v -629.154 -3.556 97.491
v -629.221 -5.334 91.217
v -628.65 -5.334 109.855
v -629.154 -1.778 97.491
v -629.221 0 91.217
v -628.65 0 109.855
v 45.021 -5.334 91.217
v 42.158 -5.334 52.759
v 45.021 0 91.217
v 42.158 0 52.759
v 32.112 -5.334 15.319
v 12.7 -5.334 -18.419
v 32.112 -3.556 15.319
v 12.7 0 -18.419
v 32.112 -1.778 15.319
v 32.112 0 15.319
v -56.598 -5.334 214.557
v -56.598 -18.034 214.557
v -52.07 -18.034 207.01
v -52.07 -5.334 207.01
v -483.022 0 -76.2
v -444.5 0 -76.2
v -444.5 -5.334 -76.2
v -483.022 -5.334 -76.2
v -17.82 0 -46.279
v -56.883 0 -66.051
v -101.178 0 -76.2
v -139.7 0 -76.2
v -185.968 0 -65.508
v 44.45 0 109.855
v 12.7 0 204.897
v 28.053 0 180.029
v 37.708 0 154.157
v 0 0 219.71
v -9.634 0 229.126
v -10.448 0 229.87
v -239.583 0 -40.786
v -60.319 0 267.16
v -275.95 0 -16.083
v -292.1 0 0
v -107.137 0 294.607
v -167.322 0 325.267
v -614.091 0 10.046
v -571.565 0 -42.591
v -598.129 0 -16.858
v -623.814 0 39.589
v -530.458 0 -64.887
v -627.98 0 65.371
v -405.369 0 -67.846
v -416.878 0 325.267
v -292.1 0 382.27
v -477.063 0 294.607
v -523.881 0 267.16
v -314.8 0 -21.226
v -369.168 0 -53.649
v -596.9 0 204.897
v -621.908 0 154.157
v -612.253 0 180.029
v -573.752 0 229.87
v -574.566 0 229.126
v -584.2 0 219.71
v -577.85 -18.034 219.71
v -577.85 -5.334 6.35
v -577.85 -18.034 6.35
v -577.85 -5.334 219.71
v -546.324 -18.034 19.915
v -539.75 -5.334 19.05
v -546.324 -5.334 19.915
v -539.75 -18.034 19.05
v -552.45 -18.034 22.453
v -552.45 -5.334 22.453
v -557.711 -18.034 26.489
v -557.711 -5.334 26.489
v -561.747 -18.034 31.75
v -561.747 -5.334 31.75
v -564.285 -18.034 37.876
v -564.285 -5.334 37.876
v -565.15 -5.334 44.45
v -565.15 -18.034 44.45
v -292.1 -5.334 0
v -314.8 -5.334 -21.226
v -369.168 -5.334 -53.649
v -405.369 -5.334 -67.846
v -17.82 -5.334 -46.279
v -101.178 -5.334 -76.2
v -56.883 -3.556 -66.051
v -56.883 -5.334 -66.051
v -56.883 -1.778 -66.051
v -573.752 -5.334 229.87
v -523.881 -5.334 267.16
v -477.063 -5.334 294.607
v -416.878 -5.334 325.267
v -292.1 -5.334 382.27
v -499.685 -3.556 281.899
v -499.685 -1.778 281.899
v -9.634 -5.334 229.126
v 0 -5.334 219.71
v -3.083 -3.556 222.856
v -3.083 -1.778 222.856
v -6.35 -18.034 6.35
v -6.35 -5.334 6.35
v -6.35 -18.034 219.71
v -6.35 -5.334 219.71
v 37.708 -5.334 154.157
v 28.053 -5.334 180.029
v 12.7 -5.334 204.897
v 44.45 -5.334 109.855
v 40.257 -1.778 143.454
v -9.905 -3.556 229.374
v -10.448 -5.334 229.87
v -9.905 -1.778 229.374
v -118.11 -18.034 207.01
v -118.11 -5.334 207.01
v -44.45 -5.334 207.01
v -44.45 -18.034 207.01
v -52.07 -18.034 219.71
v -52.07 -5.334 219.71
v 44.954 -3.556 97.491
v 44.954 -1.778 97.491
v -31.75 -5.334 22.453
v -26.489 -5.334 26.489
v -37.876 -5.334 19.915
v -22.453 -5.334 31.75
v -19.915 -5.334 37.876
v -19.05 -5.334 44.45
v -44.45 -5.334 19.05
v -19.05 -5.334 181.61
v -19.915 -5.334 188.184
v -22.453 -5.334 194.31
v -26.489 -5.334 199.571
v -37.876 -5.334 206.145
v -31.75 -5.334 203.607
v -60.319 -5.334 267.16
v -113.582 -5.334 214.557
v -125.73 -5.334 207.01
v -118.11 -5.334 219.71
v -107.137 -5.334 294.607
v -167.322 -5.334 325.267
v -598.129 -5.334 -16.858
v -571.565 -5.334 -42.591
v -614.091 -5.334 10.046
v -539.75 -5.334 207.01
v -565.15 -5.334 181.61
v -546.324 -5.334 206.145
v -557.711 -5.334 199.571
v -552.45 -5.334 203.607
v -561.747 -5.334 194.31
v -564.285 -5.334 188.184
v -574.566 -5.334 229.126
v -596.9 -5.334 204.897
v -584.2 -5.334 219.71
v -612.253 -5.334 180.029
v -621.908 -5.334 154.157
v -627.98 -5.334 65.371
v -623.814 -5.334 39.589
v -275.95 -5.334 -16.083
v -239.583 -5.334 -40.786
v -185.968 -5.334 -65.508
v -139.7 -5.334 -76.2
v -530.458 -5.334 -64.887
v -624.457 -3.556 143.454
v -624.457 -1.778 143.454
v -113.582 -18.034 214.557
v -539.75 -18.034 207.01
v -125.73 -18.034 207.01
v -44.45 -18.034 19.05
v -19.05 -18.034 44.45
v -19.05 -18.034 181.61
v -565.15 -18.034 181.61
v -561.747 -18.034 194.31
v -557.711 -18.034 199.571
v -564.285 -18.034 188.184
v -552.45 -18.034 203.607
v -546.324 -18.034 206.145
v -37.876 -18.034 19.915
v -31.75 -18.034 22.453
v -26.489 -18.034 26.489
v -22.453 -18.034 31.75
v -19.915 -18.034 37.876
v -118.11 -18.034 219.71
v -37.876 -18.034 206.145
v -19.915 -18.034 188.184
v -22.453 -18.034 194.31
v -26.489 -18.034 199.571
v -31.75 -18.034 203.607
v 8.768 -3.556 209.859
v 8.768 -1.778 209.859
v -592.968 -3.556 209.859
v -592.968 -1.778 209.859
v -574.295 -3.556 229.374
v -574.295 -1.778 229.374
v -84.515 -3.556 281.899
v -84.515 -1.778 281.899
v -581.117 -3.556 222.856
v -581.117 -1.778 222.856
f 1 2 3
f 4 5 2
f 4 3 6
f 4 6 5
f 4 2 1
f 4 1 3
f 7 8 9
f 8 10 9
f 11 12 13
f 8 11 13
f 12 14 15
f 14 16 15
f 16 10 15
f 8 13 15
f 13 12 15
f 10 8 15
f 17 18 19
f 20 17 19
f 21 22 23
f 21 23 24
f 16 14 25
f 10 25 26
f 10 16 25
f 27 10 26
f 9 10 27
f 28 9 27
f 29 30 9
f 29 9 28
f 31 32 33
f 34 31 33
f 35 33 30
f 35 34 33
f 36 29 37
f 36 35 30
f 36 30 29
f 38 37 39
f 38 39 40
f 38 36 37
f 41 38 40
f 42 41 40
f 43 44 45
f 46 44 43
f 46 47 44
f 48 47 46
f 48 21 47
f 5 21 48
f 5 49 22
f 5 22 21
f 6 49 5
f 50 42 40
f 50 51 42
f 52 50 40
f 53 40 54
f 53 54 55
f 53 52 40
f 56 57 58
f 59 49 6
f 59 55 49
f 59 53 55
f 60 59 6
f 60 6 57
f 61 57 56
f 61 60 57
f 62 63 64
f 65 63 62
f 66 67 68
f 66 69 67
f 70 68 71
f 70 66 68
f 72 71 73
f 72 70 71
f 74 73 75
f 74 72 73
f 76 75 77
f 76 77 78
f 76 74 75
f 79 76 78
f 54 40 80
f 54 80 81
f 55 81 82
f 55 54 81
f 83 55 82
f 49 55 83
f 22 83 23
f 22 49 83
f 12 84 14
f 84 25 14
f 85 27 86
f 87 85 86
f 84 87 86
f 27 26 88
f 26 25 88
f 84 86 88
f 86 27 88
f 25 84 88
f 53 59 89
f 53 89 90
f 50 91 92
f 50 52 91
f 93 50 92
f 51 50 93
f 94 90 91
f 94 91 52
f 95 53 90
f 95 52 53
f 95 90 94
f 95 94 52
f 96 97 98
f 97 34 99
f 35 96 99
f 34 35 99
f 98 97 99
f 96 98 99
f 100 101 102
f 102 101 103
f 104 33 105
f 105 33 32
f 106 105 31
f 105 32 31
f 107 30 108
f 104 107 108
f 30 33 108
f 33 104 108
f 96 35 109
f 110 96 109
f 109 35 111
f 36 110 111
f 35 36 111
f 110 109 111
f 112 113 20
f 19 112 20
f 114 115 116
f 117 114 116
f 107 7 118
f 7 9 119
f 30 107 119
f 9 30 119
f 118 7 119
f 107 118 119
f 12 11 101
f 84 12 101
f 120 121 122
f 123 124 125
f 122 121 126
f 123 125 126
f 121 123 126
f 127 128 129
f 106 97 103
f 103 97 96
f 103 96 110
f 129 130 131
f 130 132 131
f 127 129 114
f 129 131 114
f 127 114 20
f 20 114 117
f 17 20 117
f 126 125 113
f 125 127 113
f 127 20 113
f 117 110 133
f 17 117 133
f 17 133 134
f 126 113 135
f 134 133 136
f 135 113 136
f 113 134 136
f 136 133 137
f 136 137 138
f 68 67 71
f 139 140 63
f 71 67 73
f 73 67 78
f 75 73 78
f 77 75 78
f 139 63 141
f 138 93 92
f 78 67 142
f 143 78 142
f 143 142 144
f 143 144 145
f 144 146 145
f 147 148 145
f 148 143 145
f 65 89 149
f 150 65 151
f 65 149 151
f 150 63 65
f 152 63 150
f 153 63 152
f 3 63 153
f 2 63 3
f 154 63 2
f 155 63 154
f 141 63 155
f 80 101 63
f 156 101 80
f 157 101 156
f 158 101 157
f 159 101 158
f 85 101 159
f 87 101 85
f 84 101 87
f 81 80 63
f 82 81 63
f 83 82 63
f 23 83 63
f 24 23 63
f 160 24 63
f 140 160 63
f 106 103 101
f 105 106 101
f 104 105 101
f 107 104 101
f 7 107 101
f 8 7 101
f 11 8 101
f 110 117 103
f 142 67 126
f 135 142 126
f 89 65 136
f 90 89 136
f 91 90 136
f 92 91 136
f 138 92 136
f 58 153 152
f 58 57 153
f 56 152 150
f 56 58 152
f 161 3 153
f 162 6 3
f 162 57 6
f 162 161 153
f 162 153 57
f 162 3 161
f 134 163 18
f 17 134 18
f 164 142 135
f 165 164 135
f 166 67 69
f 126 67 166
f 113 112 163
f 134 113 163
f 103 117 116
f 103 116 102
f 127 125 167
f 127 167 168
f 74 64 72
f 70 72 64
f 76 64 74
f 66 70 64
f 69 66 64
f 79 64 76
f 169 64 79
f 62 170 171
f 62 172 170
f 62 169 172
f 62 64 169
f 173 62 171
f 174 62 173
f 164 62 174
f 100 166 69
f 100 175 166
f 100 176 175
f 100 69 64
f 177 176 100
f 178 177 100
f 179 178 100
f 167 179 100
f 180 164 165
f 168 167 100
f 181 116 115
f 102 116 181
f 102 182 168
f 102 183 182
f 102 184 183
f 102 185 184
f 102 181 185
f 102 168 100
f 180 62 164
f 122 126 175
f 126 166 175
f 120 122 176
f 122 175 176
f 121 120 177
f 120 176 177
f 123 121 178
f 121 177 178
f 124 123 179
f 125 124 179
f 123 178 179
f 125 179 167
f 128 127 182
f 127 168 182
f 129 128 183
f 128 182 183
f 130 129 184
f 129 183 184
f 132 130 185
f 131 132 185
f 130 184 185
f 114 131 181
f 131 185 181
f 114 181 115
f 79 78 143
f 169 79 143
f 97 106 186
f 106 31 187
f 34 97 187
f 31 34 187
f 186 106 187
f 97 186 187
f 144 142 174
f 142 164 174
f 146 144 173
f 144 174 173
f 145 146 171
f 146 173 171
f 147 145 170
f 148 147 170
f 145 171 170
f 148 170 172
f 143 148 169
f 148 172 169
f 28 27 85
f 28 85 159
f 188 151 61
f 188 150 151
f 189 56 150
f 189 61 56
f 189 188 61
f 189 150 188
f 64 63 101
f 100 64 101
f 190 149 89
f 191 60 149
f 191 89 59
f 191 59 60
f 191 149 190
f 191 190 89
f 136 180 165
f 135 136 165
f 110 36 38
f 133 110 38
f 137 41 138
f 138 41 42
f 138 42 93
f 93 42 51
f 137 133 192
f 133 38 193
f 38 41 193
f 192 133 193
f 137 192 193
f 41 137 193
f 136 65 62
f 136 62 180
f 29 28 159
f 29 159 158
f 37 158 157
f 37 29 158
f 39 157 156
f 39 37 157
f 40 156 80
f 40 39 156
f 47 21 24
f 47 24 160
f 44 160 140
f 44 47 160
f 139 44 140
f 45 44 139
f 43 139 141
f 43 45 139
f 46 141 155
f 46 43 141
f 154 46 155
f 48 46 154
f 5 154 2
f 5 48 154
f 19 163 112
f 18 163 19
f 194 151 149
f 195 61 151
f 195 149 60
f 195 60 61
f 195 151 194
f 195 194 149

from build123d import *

# Parameters (mm, degrees)
F0_W     = 584.2
F0_H     = 219.71
F1_DEPTH = 5.334
F2_W     = 571.5
F2_H     = 213.36
F2_W_2   = 546.1
F2_H_2   = 187.96
F3_DEPTH = 12.7
F4_R     = 25.4
F6_DEPTH = 12.7
F7_W     = 12.7
F7_H     = 109.855
F8_DEPTH = 5.334


# Not quite as in the source:
# - a feature names something its author has since deleted; it is built from what else it names


with BuildPart() as f1:
    # F0 (on Front) → F1 (new body)
    with BuildSketch(Plane.XZ):
        with Locations((-292.1, 109.855)):
            Rectangle(F0_W, F0_H)
    extrude(amount=F1_DEPTH)

    # F2 (on face) → F3 (join)
    with BuildSketch(Plane.XZ.offset(5.334)):
        with Locations((-292.1, 113.03)):
            Rectangle(F2_W, F2_H)
        with Locations((-292.1, 113.03)):
            Rectangle(F2_W_2, F2_H_2, mode=Mode.SUBTRACT)
    extrude(amount=F3_DEPTH)

    # F4
    f4_edges = [f1.edges().sort_by_distance(p)[0] for p in [
        (-565.15, -11.684, 207.01),
        (-19.05, -11.684, 207.01),
        (-19.05, -11.684, 19.05),
        (-565.15, -11.684, 19.05),
    ]]
    fillet(f4_edges, radius=F4_R)

    # F5 (on face) → F6 (cut)
    with BuildSketch(Plane.XZ.offset(18.034)):
        Polygon((-118.11, 219.71), (-125.73, 207.01), (-118.11, 207.01), (-113.5820166854, 214.5566388576), (-110.49, 219.71), align=None)
        Polygon((-56.5979833146, 214.5566388576), (-52.07, 207.01), (-44.45, 207.01), (-52.07, 219.71), (-59.69, 219.71), align=None)
        Polygon((-59.69, 219.71), (-110.49, 219.71), (-113.5820166854, 214.5566388576), (-56.5979833146, 214.5566388576), align=None)
    extrude(amount=-F6_DEPTH, mode=Mode.SUBTRACT)

    # F7 (on face) → F8 (join)
    with BuildSketch(Plane(origin=(0, 0, 0), x_dir=(-1, 0, 0), z_dir=(0, 1, 0))):
        with BuildLine():
            Line((292.1, 0), (0, 0))
            Line((0, 0), (-12.7, 0))
            Line((-12.7, 0), (-12.7, -18.4187279276))
            Line((-12.7, -18.4187279276), (273.05, -18.4187279276))
            add(Edge.make_bspline(
                [(292.1, 0), (287.6007994264, -5.2493532032), (283.1015988528, -10.4987064064), (273.05, -18.4187279276)],
                knots=[0, 0, 0, 0, 0.0728769887, 0.0728769887, 0.0728769887, 0.0728769887], degree=3))
        make_face()
        with Locations((-6.35, 54.9275)):
            Rectangle(F7_W, F7_H)
        with BuildLine():
            Line((-12.7, -18.4187279276), (-12.7, 0))
            Line((-12.7, 0), (-12.7, 109.855))
            Line((-12.7, 109.855), (-44.45, 109.855))
            add(Edge.make_bspline(
                [(-45.0211916342, 91.2168765815), (-45.0211916609, 97.5162300277), (-44.815953395, 103.7471754572), (-44.45, 109.855)],
                knots=[0.5639304479, 0.5639304479, 0.5639304479, 0.5639304479, 0.5870347541, 0.5870347541, 0.5870347541, 0.5870347541], degree=3))
            add(Edge.make_bspline(
                [(-12.7, -18.4187279276), (-37.5240442459, 12.5724048939), (-45.0211914731, 53.1440785365), (-45.0211916342, 91.2168765815)],
                knots=[0.4242898339, 0.4242898339, 0.4242898339, 0.4242898339, 0.5639304479, 0.5639304479, 0.5639304479, 0.5639304479], degree=3))
        make_face()
        with BuildLine():
            Line((584.2, 0), (292.1, 0))
            add(Edge.make_bspline(
                [(292.1, 0), (296.5992005736, -5.2493532032), (301.0984011472, -10.4987064064), (311.15, -18.4187279276)],
                knots=[0, 0, 0, 0, 0.0728769887, 0.0728769887, 0.0728769887, 0.0728769887], degree=3))
            Line((311.15, -18.4187279276), (596.9, -18.4187279276))
            Line((596.9, -18.4187279276), (596.9, 0))
            Line((596.9, 0), (584.2, 0))
        make_face()
        with BuildLine():
            Line((-12.7, 109.855), (0, 109.855))
            Line((0, 109.855), (0, 219.71))
            add(Edge.make_bspline(
                [(-12.7, 204.8965850641), (-8.9139816017, 209.8723459181), (-4.696536047, 214.8060326557), (0, 219.71)],
                knots=[0.7188244338, 0.7188244338, 0.7188244338, 0.7188244338, 0.7411532433, 0.7411532433, 0.7411532433, 0.7411532433], degree=3))
            Line((-12.7, 204.8965850641), (-12.7, 109.855))
        make_face()
        with BuildLine():
            Line((-44.45, 109.855), (-12.7, 109.855))
            Line((-12.7, 109.855), (-12.7, 204.8965850641))
            add(Edge.make_bspline(
                [(-44.45, 109.855), (-42.3625587956, 144.6947495266), (-35.0459362357, 175.5285199707), (-12.7, 204.8965850641)],
                knots=[0.5870347541, 0.5870347541, 0.5870347541, 0.5870347541, 0.7188244338, 0.7188244338, 0.7188244338, 0.7188244338], degree=3))
        make_face()
        with BuildLine():
            Line((273.05, -18.4187279276), (-12.7, -18.4187279276))
            add(Edge.make_bspline(
                [(101.1778231225, -76.2), (55.3698473988, -71.3735043498), (12.4455878923, -49.8112861475), (-12.7, -18.4187279276)],
                knots=[0.2828404673, 0.2828404673, 0.2828404673, 0.2828404673, 0.4242898339, 0.4242898339, 0.4242898339, 0.4242898339], degree=3))
            Line((101.1778231225, -76.2), (139.7, -76.2))
            add(Edge.make_bspline(
                [(273.05, -18.4187279276), (249.5100545477, -36.9667099273), (195.5177305995, -70.1620926298), (139.7, -76.2)],
                knots=[0.0728769887, 0.0728769887, 0.0728769887, 0.0728769887, 0.2435483779, 0.2435483779, 0.2435483779, 0.2435483779], degree=3))
        make_face()
        with BuildLine():
            Line((596.9, -18.4187279276), (311.15, -18.4187279276))
            add(Edge.make_bspline(
                [(311.15, -18.4187279276), (334.6899454523, -36.9667099273), (388.6822694005, -70.1620926298), (444.5, -76.2)],
                knots=[0.0728769887, 0.0728769887, 0.0728769887, 0.0728769887, 0.2435483779, 0.2435483779, 0.2435483779, 0.2435483779], degree=3))
            Line((444.5, -76.2), (483.0221768775, -76.2))
            add(Edge.make_bspline(
                [(483.0221768775, -76.2), (528.8301526012, -71.3735043498), (571.7544121077, -49.8112861475), (596.9, -18.4187279276)],
                knots=[0.2828404673, 0.2828404673, 0.2828404673, 0.2828404673, 0.4242898339, 0.4242898339, 0.4242898339, 0.4242898339], degree=3))
        make_face()
        with Locations((590.55, 54.9275)):
            Rectangle(F7_W, F7_H)
        with BuildLine():
            add(Edge.make_bspline(
                [(0, 219.71), (3.0172855437, 222.8605496023), (6.2323113272, 225.9988327955), (9.6341187106, 229.1255293763)],
                knots=[0.7411532433, 0.7411532433, 0.7411532433, 0.7411532433, 0.7554983677, 0.7554983677, 0.7554983677, 0.7554983677], degree=3))
            Line((0, 219.71), (292.1, 219.71))
            Line((292.1, 219.71), (9.6341187106, 229.1255293763))
        make_face()
        with BuildLine():
            Line((596.9, 0), (596.9, -18.4187279276))
            add(Edge.make_bspline(
                [(596.9, -18.4187279276), (621.7240438178, 12.5724043593), (629.2211912145, 53.144077137), (629.2211916342, 91.2168746116)],
                knots=[0.4242898339, 0.4242898339, 0.4242898339, 0.4242898339, 0.5639304455, 0.5639304455, 0.5639304455, 0.5639304455], degree=3))
            add(Edge.make_bspline(
                [(629.2211916342, 91.2168746116), (629.2211917037, 97.5162287286), (629.0159534331, 103.7471748205), (628.65, 109.855)],
                knots=[0.5639304455, 0.5639304455, 0.5639304455, 0.5639304455, 0.5870347541, 0.5870347541, 0.5870347541, 0.5870347541], degree=3))
            Line((628.65, 109.855), (596.9, 109.855))
            Line((596.9, 109.855), (596.9, 0))
        make_face()
        with BuildLine():
            Line((584.2, 219.71), (584.2, 109.855))
            Line((584.2, 109.855), (596.9, 109.855))
            Line((596.9, 109.855), (596.9, 204.8965850641))
            add(Edge.make_bspline(
                [(596.9, 204.8965850641), (593.1139816017, 209.8723459181), (588.896536047, 214.8060326557), (584.2, 219.71)],
                knots=[0.7188244338, 0.7188244338, 0.7188244338, 0.7188244338, 0.7411532433, 0.7411532433, 0.7411532433, 0.7411532433], degree=3))
        make_face()
        with BuildLine():
            add(Edge.make_bspline(
                [(9.6341187106, 229.1255293763), (9.9041896656, 229.3737591661), (10.1754378752, 229.6219159272), (10.4478578559, 229.87)],
                knots=[0.7554983677, 0.7554983677, 0.7554983677, 0.7554983677, 0.7566372333, 0.7566372333, 0.7566372333, 0.7566372333], degree=3))
            Line((9.6341187106, 229.1255293763), (292.1, 219.71))
            Line((292.1, 219.71), (574.5658812894, 229.1255293763))
            add(Edge.make_bspline(
                [(574.5658812894, 229.1255293763), (574.2958103344, 229.3737591661), (574.0245621248, 229.6219159272), (573.7521421441, 229.87)],
                knots=[0.7554983677, 0.7554983677, 0.7554983677, 0.7554983677, 0.7566372333, 0.7566372333, 0.7566372333, 0.7566372333], degree=3))
            Line((573.7521421441, 229.87), (514.35, 229.87))
            Line((514.35, 229.87), (292.1, 229.87))
            Line((292.1, 229.87), (69.85, 229.87))
            Line((69.85, 229.87), (10.4478578559, 229.87))
        make_face()
        with BuildLine():
            Line((574.5658812894, 229.1255293763), (292.1, 219.71))
            Line((292.1, 219.71), (584.2, 219.71))
            add(Edge.make_bspline(
                [(584.2, 219.71), (581.1827144563, 222.8605496023), (577.9676886728, 225.9988327955), (574.5658812894, 229.1255293763)],
                knots=[0.7411532433, 0.7411532433, 0.7411532433, 0.7411532433, 0.7554983677, 0.7554983677, 0.7554983677, 0.7554983677], degree=3))
        make_face()
        with BuildLine():
            Line((596.9, 204.8965850641), (596.9, 109.855))
            Line((596.9, 109.855), (628.65, 109.855))
            add(Edge.make_bspline(
                [(628.65, 109.855), (626.5625587956, 144.6947495266), (619.2459362357, 175.5285199707), (596.9, 204.8965850641)],
                knots=[0.5870347541, 0.5870347541, 0.5870347541, 0.5870347541, 0.7188244338, 0.7188244338, 0.7188244338, 0.7188244338], degree=3))
        make_face()
        with BuildLine():
            add(Edge.make_bspline(
                [(10.4478578559, 229.87), (68.6609423687, 282.8827748158), (180.3804711844, 332.5763874079), (292.1, 382.27)],
                knots=[0.7566372333, 0.7566372333, 0.7566372333, 0.7566372333, 1, 1, 1, 1], degree=3))
            Line((10.4478578559, 229.87), (69.85, 229.87))
            Line((69.85, 229.87), (292.1, 229.87))
            Line((292.1, 229.87), (292.1, 382.27))
        make_face()
        with BuildLine():
            add(Edge.make_bspline(
                [(573.7521421441, 229.87), (515.5390576313, 282.8827748158), (403.8195288156, 332.5763874079), (292.1, 382.27)],
                knots=[0.7566372333, 0.7566372333, 0.7566372333, 0.7566372333, 1, 1, 1, 1], degree=3))
            Line((292.1, 382.27), (292.1, 229.87))
            Line((292.1, 229.87), (514.35, 229.87))
            Line((514.35, 229.87), (573.7521421441, 229.87))
        make_face()
    extrude(amount=-F8_DEPTH)


solid = f1.part
